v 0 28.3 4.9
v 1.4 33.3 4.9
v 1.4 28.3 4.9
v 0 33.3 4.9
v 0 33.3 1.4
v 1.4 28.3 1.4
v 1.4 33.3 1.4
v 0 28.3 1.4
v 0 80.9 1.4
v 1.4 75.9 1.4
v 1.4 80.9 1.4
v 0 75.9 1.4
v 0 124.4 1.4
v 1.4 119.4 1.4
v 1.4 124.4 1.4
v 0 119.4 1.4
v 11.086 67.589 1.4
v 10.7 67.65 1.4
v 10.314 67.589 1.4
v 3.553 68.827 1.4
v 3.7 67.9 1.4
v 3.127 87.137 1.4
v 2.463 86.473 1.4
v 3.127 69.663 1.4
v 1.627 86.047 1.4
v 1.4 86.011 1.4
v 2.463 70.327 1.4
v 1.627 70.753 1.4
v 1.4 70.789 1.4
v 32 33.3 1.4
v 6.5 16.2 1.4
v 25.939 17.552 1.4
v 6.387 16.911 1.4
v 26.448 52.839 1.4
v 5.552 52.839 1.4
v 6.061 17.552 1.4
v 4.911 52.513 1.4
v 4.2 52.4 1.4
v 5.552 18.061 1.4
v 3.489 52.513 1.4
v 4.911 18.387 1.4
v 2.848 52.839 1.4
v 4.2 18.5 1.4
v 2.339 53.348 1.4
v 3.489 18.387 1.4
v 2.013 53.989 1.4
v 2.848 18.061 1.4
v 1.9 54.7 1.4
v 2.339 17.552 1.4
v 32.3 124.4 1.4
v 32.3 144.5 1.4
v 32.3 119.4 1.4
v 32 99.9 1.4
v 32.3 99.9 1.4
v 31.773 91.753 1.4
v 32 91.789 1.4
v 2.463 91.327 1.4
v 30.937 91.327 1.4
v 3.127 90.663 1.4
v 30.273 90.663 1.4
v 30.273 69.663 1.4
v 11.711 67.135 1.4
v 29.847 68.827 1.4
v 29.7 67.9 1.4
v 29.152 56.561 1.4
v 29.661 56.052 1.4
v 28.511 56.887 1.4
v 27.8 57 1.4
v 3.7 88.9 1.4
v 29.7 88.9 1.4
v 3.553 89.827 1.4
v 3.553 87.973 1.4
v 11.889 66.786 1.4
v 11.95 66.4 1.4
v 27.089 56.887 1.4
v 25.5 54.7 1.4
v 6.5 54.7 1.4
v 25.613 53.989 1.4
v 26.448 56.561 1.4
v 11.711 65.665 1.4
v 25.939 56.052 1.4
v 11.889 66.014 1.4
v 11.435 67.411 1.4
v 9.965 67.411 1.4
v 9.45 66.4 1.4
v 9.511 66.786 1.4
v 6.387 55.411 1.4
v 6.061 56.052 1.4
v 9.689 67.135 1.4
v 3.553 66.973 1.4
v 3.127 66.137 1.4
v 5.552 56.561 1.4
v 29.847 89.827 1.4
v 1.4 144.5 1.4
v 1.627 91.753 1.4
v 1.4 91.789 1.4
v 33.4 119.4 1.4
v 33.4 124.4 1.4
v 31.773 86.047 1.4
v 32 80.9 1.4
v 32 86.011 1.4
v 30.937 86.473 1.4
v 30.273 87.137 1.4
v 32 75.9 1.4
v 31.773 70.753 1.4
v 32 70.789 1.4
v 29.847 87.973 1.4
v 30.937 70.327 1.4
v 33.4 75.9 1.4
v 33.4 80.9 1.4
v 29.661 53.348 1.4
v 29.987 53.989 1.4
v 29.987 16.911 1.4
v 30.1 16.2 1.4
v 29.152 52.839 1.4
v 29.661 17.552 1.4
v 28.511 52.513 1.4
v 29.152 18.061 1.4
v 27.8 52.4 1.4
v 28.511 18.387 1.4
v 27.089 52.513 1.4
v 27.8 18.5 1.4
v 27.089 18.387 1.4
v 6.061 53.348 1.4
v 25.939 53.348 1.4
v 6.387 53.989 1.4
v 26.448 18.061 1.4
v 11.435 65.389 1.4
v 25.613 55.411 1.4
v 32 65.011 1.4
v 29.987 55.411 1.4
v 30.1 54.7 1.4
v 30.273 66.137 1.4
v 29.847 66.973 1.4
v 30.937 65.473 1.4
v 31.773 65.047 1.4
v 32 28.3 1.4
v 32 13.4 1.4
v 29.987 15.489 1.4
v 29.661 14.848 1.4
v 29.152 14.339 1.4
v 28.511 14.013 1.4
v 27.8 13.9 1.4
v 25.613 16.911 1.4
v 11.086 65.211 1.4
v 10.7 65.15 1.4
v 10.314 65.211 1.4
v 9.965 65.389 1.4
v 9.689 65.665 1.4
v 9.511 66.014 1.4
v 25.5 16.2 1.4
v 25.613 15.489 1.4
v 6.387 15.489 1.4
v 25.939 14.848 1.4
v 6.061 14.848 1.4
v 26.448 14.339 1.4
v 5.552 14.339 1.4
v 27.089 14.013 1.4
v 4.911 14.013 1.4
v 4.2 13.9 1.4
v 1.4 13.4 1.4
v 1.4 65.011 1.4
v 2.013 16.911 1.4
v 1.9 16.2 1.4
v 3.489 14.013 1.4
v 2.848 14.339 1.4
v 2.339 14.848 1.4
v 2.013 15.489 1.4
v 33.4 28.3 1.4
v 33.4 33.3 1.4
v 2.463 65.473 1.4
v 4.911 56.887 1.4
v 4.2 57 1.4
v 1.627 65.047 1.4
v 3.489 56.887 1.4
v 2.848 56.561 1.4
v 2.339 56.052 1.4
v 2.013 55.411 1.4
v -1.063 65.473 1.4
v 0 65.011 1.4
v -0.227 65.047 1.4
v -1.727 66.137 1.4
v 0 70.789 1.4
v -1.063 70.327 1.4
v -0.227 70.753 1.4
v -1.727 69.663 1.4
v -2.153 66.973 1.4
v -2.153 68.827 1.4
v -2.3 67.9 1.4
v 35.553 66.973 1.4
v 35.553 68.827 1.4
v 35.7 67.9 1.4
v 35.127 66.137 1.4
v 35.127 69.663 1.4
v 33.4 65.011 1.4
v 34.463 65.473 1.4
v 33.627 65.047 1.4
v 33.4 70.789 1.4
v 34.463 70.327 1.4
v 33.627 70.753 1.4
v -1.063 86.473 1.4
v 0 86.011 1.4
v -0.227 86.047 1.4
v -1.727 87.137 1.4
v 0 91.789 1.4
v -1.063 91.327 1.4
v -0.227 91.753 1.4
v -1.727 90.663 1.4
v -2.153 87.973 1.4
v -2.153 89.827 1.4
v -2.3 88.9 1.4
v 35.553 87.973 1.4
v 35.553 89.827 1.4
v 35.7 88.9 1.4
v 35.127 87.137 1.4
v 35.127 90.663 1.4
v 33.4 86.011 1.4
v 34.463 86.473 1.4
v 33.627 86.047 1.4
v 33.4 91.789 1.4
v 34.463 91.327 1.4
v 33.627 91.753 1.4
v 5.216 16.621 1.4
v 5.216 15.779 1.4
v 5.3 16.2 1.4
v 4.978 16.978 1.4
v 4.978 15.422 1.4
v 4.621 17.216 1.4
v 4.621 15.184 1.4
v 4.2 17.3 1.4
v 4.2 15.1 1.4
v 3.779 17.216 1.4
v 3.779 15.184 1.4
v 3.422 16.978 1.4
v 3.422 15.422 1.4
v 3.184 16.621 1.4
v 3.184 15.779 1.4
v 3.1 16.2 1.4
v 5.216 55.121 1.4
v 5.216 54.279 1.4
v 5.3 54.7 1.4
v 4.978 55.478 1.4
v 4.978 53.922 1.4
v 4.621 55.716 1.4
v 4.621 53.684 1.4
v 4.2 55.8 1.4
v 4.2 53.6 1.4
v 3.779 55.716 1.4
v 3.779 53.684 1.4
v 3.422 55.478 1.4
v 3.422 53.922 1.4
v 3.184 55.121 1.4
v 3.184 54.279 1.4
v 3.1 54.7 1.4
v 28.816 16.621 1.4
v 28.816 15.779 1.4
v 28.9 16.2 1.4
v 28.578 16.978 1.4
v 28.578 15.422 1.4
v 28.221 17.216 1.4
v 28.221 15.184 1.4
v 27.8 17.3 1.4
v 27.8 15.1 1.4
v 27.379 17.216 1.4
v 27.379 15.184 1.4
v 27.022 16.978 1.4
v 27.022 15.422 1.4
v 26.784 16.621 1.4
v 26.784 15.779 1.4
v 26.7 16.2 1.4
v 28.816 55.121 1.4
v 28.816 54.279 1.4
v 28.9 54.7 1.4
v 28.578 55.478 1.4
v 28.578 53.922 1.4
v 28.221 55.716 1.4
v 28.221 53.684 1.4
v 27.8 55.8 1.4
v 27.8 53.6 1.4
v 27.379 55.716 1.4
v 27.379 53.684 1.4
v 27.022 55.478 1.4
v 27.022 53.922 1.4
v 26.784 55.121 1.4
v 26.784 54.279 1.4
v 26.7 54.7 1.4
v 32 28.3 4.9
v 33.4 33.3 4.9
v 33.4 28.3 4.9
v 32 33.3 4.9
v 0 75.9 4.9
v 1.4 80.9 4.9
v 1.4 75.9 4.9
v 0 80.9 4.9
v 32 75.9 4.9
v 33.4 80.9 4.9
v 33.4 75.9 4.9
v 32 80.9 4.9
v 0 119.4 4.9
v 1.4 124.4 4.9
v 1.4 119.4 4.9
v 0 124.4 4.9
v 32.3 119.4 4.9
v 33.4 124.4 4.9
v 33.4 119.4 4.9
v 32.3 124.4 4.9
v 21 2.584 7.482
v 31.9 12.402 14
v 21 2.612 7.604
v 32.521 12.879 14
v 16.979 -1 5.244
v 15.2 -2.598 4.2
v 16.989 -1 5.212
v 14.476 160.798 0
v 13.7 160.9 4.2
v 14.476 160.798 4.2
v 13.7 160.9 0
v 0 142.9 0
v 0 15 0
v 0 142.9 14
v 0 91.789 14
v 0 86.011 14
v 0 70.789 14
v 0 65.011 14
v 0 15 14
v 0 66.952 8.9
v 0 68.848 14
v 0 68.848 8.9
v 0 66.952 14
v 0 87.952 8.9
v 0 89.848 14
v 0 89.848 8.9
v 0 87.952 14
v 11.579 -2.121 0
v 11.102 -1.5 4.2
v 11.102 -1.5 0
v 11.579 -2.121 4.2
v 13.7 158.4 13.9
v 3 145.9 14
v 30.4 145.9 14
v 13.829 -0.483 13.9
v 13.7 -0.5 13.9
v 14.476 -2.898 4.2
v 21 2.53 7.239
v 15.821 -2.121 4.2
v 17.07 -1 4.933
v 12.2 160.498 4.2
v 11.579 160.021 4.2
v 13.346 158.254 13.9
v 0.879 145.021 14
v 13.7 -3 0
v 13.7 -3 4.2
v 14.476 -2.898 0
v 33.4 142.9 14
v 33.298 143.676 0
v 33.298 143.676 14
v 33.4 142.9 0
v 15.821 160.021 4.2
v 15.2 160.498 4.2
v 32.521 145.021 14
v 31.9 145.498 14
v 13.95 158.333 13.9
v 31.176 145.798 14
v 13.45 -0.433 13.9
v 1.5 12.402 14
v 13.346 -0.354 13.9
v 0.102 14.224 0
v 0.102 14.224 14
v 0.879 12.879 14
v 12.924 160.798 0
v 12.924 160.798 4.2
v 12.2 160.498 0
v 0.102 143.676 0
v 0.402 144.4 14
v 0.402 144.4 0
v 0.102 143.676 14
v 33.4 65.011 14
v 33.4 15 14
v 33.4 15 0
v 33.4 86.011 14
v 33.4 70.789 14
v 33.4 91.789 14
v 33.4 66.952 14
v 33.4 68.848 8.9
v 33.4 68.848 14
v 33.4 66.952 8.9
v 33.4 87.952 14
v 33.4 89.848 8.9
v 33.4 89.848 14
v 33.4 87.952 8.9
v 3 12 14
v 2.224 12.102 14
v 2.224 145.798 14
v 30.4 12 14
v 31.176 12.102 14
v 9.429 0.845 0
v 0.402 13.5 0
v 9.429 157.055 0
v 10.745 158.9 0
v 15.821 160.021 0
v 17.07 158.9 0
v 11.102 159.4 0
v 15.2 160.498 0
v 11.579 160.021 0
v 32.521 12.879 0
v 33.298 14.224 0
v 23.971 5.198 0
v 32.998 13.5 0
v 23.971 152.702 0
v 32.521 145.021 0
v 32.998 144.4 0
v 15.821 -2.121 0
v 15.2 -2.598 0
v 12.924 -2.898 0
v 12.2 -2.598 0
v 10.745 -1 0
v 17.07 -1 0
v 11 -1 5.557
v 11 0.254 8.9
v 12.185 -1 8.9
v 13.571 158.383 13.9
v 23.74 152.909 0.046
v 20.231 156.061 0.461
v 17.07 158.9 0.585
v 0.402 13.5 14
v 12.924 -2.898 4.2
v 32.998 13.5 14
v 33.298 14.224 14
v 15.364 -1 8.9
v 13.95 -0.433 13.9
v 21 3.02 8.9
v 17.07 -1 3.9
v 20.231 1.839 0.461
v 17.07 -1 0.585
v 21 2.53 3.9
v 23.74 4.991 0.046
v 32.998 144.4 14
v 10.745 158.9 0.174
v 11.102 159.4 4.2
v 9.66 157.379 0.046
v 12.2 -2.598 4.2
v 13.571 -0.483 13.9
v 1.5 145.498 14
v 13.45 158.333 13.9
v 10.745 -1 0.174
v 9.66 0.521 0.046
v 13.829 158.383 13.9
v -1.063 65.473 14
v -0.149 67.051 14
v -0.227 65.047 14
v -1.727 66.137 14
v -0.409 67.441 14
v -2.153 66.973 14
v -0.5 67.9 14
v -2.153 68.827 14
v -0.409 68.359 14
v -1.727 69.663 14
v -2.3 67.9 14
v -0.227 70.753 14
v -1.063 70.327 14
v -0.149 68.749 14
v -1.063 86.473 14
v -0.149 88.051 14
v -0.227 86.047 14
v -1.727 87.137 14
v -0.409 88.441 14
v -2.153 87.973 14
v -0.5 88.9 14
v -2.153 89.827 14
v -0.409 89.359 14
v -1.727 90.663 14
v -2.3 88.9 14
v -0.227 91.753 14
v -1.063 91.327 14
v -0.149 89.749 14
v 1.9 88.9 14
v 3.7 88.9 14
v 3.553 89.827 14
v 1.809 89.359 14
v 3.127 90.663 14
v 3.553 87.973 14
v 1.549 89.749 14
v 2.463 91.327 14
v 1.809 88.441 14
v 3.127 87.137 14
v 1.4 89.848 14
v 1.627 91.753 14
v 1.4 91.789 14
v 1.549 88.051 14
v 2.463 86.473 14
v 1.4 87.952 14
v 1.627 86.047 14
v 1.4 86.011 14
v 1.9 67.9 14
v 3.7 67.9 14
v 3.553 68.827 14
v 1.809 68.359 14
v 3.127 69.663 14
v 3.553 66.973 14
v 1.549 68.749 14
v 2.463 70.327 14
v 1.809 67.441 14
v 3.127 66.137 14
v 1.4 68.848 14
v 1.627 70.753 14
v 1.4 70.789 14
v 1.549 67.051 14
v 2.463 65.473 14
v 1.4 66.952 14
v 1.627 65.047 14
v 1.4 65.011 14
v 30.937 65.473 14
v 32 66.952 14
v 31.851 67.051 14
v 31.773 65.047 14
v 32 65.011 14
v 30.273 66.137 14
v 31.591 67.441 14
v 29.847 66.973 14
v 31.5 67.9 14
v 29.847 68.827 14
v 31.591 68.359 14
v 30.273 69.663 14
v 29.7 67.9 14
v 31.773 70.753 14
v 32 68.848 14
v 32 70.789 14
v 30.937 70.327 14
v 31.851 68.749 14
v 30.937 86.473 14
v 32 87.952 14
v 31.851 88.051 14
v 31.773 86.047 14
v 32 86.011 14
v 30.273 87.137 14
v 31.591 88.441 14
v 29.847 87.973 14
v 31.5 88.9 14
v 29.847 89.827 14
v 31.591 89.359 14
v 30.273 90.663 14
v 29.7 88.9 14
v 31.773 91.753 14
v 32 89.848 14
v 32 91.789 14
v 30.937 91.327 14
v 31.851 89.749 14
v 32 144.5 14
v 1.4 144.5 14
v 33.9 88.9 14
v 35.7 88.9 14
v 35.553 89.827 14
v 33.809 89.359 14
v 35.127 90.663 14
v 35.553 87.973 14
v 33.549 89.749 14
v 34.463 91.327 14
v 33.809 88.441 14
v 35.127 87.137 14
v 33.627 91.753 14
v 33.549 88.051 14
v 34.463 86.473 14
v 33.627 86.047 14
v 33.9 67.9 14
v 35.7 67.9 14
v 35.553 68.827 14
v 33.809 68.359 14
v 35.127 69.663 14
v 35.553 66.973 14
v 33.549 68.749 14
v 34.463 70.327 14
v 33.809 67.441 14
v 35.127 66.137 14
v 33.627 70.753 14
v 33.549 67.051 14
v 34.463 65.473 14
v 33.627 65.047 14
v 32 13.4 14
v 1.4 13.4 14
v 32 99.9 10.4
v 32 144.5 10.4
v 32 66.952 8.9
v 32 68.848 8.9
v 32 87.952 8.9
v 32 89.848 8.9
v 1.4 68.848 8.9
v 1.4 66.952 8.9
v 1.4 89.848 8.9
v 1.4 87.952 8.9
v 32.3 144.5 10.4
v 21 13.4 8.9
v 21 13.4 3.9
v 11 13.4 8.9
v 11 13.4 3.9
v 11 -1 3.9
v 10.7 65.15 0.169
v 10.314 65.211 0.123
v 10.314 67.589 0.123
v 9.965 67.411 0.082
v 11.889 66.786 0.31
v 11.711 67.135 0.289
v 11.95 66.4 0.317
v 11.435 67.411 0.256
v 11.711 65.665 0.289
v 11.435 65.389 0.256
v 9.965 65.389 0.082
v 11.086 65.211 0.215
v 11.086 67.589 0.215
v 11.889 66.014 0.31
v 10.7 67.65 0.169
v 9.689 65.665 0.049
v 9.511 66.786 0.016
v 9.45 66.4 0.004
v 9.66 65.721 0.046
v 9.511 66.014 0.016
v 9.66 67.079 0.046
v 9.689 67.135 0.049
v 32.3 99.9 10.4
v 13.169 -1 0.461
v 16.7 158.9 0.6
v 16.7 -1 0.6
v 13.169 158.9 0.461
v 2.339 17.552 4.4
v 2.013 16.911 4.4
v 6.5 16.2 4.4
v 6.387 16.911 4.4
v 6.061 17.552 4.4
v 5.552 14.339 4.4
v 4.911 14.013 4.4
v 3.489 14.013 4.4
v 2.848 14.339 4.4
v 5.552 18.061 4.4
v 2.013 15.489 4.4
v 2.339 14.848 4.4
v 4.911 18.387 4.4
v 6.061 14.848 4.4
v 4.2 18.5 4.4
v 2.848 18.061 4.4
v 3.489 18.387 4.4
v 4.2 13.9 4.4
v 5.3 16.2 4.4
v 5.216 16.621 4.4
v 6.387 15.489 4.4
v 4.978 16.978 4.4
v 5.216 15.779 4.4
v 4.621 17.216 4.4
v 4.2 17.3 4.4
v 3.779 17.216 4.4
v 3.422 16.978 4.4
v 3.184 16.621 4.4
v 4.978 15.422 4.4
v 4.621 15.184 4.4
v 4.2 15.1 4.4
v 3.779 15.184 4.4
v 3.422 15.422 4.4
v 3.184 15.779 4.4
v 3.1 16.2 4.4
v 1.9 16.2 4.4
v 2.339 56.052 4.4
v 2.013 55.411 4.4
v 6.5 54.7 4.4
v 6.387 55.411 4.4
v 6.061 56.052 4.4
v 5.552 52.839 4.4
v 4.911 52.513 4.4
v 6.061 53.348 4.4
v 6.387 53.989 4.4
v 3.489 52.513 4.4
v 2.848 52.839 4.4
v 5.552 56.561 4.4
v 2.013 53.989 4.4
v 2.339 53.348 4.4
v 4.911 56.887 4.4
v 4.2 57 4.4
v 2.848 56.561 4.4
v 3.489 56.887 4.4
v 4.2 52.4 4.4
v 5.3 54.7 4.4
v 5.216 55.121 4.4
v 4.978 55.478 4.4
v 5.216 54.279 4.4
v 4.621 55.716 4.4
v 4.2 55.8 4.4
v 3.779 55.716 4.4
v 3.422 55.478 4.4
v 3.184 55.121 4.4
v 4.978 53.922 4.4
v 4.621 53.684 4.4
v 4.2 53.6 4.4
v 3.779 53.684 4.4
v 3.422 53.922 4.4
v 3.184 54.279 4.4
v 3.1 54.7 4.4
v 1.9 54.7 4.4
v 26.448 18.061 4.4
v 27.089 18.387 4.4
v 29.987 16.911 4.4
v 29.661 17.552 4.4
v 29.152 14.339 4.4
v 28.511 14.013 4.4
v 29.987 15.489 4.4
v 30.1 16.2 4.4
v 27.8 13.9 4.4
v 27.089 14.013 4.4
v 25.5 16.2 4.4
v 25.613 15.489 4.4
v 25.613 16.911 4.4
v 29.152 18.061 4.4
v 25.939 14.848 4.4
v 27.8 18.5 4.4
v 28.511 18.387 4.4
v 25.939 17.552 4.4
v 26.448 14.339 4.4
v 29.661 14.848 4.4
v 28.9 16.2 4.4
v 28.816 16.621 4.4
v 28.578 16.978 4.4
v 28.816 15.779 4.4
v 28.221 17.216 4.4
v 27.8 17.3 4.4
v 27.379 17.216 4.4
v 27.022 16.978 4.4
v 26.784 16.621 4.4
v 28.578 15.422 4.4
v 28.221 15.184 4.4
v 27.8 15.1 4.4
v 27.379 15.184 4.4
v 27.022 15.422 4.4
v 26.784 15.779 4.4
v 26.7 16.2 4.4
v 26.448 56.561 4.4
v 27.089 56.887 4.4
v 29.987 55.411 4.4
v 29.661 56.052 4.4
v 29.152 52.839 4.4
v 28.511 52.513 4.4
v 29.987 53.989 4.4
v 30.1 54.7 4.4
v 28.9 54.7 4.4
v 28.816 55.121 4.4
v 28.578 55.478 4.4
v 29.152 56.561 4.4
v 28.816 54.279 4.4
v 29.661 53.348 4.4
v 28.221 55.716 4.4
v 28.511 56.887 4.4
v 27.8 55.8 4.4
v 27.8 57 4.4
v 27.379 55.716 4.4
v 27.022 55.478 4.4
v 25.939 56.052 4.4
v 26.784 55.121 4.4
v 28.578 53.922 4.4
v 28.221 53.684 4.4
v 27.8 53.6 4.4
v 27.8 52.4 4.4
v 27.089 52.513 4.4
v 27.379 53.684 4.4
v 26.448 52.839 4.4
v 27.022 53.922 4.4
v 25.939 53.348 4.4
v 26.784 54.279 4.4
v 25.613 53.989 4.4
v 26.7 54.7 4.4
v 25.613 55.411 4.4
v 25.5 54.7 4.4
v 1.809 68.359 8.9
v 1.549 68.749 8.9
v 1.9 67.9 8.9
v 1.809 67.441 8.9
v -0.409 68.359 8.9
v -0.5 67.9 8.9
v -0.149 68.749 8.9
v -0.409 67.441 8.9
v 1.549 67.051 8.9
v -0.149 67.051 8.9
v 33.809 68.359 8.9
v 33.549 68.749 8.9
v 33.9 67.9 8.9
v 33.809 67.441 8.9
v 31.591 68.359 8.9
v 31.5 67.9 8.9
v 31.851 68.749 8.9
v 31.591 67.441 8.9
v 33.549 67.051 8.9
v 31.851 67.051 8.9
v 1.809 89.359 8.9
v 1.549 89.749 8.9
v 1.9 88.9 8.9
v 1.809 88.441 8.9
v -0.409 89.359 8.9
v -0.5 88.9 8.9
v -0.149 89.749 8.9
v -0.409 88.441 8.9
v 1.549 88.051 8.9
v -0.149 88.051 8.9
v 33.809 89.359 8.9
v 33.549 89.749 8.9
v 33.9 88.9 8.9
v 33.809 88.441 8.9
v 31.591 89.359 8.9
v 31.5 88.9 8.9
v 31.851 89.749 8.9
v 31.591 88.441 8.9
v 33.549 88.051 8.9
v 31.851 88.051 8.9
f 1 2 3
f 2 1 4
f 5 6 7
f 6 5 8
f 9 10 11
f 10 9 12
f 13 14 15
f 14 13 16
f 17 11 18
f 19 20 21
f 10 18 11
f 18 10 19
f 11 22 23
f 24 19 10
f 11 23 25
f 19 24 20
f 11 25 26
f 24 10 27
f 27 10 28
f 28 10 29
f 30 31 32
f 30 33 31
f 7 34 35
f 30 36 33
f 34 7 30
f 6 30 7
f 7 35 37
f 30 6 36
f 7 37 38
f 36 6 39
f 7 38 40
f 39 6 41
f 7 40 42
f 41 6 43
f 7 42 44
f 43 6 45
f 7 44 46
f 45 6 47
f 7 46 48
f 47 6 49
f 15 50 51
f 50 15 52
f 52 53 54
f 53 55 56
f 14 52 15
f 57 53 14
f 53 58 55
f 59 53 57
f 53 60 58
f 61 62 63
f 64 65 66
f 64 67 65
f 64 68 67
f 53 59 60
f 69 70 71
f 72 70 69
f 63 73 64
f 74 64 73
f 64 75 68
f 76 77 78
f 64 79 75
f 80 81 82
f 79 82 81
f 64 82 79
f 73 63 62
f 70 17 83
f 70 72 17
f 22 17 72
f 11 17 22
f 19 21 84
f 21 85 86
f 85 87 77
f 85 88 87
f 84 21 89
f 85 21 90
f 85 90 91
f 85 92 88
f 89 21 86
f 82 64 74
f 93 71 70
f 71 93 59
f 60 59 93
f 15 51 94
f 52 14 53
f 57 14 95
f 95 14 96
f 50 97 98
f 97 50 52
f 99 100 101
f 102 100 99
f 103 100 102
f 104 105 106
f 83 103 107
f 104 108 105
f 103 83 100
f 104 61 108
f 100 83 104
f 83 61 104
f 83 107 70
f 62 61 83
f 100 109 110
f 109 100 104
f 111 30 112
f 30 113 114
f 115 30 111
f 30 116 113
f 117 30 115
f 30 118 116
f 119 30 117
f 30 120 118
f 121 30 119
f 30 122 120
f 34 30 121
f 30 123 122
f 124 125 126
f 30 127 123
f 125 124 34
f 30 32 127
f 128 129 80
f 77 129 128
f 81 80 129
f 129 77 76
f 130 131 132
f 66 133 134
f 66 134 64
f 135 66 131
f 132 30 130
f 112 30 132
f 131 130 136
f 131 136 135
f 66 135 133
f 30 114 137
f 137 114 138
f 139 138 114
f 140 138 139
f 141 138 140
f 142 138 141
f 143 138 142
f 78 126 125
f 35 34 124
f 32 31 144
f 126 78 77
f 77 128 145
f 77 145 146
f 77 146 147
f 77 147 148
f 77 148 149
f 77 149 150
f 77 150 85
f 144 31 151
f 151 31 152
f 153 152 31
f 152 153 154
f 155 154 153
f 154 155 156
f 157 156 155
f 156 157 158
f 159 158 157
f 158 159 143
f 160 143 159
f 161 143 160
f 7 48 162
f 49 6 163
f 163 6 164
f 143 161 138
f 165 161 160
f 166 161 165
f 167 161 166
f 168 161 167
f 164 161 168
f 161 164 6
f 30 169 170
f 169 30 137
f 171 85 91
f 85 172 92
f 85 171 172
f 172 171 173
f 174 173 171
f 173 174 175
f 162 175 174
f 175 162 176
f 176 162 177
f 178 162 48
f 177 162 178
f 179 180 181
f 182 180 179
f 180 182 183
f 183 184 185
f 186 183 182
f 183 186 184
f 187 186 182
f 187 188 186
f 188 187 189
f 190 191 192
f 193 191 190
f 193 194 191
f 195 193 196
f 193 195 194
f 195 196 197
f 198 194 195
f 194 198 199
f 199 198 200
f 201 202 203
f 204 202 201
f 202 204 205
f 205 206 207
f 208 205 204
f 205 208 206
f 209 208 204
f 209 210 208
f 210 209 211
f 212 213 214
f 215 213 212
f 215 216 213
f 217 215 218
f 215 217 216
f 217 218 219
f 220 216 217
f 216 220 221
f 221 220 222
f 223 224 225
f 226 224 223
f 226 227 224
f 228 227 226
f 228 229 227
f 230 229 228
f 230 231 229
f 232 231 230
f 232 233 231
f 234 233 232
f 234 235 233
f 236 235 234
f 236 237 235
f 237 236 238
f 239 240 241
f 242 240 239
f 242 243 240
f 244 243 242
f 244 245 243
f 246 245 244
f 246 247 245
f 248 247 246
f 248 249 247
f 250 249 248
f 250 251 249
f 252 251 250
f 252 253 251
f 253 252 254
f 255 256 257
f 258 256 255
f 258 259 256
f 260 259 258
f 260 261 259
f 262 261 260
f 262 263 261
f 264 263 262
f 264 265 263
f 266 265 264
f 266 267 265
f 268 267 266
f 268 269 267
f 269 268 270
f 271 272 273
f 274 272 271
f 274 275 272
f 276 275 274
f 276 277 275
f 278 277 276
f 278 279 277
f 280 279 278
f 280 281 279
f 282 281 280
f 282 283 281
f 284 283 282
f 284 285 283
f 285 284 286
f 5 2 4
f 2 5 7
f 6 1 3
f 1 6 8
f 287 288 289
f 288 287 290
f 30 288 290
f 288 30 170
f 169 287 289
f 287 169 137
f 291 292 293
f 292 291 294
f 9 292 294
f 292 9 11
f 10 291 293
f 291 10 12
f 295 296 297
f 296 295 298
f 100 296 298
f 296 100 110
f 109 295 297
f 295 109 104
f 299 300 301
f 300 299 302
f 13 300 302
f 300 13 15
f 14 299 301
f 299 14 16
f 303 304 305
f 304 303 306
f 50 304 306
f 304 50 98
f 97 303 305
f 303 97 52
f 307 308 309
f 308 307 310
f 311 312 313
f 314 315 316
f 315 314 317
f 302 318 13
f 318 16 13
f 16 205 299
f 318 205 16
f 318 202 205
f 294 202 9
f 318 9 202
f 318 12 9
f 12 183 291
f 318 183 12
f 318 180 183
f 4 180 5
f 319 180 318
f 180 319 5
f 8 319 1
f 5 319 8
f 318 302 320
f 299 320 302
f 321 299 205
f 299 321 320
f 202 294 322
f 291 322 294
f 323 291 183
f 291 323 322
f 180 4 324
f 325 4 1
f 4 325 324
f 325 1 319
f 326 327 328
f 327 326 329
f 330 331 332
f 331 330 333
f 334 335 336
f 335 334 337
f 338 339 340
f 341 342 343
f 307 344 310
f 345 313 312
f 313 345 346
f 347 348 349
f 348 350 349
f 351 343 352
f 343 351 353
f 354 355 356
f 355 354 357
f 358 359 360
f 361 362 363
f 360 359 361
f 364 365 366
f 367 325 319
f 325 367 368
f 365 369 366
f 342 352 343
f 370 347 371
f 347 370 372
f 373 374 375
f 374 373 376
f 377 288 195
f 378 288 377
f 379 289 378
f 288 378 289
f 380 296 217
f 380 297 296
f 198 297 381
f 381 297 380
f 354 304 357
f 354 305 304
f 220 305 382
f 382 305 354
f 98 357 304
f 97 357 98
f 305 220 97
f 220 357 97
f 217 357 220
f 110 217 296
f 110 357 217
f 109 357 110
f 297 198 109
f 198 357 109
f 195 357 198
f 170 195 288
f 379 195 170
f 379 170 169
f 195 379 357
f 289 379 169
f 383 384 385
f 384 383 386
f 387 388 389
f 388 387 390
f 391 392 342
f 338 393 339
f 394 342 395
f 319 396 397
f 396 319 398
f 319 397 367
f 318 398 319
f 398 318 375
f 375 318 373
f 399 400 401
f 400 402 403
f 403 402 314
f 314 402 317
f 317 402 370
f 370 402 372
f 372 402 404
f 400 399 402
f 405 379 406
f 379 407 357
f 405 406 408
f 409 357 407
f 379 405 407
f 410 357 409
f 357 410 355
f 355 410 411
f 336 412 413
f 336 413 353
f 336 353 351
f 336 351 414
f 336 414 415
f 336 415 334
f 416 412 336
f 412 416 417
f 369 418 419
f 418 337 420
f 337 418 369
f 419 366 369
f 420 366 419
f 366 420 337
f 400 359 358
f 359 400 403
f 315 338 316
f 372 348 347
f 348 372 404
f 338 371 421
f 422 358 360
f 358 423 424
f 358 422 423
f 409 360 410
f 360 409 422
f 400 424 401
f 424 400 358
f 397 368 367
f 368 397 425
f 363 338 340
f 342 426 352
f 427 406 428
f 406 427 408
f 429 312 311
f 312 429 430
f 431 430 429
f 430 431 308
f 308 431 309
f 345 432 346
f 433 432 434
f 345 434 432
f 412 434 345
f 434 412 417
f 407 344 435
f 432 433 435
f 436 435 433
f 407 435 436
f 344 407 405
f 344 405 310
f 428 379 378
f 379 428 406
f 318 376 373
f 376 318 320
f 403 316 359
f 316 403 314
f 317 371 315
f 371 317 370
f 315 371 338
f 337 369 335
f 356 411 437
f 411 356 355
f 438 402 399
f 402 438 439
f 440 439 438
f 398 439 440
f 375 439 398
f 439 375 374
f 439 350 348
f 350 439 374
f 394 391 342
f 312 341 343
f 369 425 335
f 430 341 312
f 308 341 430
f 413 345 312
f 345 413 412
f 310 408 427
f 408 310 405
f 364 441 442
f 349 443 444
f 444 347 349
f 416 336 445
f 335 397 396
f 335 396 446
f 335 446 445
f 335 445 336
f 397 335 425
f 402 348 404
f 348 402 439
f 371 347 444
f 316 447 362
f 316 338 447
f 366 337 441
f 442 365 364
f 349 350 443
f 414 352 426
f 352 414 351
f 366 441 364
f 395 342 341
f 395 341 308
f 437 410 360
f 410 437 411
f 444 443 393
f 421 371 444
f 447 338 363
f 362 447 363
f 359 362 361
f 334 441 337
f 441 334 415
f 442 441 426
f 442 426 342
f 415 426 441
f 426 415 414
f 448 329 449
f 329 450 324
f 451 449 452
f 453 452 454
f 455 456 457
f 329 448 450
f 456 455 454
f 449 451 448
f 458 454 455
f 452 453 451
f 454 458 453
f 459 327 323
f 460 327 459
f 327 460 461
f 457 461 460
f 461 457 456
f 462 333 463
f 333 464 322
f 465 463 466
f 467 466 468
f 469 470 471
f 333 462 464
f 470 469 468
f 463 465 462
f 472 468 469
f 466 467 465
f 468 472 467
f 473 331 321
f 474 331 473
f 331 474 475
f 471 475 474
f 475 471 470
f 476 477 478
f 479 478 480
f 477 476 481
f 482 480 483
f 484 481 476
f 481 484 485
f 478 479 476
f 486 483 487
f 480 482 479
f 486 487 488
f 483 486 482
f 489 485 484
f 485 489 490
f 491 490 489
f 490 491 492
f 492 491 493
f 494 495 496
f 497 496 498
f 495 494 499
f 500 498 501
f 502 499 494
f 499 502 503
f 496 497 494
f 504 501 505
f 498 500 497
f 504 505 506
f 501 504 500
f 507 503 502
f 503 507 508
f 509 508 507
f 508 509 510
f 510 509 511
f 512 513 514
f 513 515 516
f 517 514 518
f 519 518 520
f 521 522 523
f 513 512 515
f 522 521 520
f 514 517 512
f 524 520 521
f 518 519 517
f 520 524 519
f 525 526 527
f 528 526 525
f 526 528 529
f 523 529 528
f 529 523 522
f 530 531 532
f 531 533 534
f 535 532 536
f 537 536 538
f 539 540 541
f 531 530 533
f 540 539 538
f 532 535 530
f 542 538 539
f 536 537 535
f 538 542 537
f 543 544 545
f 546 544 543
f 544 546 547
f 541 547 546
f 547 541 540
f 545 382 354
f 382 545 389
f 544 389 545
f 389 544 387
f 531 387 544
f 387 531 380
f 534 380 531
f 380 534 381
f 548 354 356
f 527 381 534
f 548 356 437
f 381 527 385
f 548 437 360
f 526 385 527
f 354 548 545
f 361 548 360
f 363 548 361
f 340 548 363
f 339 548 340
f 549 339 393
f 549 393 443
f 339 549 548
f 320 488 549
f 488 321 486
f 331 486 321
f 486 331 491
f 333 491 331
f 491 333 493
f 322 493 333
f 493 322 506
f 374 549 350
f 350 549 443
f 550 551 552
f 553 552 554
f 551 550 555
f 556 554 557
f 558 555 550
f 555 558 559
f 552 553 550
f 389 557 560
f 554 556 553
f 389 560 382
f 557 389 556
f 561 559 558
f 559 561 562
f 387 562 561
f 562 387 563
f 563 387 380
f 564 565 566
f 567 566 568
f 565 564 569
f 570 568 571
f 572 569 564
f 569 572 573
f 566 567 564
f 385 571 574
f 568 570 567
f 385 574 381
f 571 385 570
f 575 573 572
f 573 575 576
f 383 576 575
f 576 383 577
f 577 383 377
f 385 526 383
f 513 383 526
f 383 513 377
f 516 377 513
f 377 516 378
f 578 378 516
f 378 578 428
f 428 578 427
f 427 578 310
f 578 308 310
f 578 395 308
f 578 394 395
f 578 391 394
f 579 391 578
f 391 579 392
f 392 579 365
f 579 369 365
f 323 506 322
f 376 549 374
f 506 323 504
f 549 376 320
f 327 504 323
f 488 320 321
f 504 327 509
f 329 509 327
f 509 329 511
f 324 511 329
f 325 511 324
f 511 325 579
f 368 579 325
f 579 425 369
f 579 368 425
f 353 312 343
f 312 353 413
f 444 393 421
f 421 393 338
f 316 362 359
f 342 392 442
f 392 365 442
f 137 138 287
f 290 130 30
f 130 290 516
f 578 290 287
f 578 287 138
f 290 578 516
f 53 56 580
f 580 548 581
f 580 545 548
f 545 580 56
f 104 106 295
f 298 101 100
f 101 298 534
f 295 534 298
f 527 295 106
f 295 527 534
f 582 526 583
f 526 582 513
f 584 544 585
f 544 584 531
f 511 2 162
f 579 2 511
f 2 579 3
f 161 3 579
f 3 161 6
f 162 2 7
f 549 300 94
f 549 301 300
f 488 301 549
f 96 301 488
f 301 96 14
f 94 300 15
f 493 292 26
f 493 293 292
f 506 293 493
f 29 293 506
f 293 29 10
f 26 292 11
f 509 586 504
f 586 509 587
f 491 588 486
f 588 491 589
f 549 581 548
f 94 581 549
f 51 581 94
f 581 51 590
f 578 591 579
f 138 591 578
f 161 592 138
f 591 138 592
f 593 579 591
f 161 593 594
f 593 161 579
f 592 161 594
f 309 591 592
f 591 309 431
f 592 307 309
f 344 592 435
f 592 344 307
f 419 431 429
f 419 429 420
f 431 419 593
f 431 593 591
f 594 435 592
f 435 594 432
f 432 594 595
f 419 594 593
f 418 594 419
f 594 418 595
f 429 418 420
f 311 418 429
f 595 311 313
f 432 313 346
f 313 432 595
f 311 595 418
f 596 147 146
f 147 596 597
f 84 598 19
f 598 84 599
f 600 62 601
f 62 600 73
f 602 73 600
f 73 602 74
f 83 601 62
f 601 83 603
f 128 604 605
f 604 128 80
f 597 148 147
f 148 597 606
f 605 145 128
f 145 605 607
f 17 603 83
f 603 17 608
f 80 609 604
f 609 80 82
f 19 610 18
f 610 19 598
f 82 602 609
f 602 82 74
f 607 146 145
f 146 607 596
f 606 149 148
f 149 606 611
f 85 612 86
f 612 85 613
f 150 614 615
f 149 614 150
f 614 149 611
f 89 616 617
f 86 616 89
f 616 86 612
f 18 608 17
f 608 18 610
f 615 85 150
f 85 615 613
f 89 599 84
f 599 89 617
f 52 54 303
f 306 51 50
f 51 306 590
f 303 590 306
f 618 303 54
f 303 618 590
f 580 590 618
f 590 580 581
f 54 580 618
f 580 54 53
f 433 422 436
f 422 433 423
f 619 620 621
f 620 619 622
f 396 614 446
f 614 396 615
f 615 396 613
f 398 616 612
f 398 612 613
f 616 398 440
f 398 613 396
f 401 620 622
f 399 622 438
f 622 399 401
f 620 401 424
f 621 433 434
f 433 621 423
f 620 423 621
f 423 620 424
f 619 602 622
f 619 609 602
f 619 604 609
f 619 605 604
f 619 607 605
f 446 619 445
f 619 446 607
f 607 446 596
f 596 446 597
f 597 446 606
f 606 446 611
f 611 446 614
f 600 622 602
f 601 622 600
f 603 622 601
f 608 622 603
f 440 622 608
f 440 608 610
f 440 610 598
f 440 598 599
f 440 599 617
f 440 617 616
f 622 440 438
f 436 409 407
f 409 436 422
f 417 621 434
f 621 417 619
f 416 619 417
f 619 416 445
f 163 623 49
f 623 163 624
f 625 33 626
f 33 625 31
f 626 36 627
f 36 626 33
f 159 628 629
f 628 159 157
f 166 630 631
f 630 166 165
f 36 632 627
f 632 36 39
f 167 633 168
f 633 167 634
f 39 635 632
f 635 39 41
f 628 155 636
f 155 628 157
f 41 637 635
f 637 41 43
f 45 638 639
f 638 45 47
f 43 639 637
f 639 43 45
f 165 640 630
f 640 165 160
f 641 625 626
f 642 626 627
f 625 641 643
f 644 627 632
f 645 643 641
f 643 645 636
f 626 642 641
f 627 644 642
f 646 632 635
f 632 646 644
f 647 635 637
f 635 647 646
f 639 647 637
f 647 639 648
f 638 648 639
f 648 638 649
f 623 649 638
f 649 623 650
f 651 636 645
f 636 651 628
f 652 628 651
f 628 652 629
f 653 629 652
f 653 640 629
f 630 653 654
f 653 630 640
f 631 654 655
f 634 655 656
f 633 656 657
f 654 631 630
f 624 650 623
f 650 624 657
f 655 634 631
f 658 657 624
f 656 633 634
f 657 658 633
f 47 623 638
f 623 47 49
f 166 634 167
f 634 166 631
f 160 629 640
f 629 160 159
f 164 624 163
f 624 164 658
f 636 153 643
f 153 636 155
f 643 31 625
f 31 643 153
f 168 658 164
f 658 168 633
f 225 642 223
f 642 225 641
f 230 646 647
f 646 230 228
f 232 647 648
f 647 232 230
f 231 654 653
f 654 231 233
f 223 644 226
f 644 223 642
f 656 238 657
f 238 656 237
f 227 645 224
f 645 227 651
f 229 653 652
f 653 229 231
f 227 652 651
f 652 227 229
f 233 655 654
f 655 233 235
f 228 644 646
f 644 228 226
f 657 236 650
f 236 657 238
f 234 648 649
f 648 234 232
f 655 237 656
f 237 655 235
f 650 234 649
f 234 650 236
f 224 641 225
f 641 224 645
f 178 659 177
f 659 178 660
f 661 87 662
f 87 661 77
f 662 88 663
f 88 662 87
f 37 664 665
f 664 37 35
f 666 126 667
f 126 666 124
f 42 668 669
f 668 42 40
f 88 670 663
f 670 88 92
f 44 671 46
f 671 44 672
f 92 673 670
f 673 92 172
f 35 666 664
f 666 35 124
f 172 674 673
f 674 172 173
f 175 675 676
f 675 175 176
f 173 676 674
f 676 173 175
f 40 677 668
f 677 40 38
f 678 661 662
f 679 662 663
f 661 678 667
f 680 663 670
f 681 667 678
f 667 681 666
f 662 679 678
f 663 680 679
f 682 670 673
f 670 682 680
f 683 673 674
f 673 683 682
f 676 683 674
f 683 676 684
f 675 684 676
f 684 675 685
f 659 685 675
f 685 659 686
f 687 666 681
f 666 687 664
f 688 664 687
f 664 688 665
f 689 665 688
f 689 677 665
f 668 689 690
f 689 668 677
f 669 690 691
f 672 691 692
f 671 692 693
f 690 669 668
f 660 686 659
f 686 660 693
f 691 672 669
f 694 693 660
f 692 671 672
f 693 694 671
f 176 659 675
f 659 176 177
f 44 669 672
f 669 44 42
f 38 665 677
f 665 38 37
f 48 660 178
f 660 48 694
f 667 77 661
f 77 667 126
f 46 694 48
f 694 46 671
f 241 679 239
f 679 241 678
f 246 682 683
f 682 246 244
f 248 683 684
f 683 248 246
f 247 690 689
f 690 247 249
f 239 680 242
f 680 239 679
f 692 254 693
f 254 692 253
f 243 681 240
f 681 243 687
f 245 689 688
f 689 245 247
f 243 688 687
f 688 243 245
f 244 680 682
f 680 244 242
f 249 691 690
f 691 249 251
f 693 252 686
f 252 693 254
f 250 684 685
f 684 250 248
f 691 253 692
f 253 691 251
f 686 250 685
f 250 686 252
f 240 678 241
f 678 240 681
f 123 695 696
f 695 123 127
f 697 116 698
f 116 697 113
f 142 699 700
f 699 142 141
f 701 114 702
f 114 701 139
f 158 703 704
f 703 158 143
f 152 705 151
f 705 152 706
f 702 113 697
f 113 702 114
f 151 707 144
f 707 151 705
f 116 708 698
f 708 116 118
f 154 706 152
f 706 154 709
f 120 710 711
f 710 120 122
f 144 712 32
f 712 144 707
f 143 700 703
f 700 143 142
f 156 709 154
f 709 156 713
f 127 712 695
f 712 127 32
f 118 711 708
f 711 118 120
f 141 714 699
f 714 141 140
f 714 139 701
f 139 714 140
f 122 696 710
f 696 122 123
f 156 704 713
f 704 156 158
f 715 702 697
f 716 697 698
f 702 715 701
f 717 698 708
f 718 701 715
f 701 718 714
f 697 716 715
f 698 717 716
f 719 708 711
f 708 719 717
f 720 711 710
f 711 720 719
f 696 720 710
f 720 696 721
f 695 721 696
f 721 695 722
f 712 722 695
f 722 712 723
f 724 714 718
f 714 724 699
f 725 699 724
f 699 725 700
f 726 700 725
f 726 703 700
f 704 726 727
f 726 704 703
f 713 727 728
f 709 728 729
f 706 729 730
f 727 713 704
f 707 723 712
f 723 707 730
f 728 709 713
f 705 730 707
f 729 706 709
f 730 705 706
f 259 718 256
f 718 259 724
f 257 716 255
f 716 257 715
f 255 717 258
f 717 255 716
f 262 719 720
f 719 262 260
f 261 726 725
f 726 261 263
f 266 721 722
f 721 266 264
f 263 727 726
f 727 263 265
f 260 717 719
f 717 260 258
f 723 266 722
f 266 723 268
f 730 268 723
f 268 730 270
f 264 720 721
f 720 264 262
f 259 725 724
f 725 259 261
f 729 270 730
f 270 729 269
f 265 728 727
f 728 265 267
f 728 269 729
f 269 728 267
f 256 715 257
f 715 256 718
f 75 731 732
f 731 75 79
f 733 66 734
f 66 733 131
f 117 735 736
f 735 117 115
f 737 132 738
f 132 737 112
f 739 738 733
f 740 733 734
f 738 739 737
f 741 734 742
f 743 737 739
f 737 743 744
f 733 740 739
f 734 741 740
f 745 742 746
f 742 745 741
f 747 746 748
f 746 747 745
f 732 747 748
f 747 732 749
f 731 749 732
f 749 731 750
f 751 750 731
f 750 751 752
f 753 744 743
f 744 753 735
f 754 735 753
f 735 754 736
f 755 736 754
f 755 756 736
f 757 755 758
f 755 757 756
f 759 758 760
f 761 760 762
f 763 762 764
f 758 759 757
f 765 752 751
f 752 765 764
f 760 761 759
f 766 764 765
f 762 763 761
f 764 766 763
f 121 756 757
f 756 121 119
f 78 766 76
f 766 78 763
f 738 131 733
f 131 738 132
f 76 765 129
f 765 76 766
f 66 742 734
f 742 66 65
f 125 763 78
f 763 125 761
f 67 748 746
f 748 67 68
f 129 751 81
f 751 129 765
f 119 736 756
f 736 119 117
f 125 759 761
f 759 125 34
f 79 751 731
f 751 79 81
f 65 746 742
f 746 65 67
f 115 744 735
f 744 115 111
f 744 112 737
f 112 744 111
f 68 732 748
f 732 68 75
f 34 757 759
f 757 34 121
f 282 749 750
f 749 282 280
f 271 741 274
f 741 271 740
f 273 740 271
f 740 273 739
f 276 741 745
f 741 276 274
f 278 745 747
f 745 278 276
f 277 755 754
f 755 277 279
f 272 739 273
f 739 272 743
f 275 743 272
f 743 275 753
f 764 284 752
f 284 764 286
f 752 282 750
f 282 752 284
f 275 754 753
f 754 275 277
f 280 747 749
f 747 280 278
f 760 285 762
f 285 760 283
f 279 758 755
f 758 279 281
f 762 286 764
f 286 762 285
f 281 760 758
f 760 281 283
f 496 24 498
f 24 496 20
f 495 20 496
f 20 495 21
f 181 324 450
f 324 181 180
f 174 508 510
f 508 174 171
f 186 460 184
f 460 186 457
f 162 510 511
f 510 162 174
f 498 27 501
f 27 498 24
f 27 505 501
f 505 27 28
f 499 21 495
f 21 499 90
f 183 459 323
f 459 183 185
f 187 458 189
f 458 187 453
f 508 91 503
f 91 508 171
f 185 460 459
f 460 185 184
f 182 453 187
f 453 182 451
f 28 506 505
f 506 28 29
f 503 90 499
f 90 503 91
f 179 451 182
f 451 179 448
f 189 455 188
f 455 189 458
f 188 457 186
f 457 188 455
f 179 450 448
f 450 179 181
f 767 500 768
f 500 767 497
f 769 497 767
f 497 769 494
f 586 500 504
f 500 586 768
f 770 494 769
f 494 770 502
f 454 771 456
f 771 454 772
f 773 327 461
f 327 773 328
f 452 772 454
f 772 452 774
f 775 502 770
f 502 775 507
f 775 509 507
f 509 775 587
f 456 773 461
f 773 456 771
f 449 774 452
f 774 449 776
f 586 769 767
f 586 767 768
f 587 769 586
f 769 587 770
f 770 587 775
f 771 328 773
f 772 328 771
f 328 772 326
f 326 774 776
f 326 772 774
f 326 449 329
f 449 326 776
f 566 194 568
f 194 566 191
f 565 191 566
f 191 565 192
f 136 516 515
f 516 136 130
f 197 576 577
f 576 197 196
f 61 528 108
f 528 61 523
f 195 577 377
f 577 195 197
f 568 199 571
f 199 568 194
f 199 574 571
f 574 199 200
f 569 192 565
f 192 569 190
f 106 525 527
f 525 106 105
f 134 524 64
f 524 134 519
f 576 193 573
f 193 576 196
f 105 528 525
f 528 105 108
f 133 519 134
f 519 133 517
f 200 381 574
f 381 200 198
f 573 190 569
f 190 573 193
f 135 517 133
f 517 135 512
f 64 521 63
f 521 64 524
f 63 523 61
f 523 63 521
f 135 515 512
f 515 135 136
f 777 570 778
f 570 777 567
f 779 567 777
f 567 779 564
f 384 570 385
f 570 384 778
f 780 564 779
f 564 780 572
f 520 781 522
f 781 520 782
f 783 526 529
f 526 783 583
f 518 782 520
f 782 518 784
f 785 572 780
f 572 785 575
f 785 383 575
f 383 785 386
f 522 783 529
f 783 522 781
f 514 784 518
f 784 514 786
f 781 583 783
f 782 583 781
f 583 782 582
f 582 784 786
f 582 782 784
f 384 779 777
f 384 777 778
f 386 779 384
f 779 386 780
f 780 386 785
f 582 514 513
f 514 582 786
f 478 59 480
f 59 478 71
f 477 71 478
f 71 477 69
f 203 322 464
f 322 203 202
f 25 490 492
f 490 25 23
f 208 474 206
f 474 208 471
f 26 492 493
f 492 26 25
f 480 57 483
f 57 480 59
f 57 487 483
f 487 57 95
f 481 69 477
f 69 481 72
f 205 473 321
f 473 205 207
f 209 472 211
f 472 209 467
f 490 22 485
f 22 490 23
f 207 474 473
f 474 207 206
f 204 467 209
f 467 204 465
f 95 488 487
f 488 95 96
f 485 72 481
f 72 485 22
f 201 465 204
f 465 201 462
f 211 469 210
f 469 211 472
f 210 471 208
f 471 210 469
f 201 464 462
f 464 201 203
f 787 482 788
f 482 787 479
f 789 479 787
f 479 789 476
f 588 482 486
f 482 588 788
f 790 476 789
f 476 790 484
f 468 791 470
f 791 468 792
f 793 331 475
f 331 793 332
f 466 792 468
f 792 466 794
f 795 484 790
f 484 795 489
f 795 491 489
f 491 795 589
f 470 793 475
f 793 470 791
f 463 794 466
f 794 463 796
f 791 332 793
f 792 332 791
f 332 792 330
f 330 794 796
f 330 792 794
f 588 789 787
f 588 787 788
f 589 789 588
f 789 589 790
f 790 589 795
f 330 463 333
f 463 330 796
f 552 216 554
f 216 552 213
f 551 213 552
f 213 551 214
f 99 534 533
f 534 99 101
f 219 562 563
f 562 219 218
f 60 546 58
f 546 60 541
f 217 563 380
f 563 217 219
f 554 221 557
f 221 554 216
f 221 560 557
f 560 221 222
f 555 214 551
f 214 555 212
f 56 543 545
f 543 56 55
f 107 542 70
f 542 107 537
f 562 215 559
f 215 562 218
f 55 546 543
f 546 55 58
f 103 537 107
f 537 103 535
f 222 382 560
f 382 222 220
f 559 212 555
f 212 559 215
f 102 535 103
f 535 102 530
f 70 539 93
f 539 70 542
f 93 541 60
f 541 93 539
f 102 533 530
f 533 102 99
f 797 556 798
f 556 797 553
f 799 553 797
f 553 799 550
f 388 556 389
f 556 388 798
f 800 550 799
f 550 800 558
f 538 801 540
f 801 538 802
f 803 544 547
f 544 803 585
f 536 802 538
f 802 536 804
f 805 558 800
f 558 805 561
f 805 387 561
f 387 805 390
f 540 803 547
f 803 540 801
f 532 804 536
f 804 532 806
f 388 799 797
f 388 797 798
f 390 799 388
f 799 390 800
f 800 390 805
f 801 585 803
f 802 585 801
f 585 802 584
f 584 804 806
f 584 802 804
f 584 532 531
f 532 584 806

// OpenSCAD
// Wasserraketen-Tracker Gehäuse v4 — Aerodynamisch, leicht, Klebebefestigung
// Auf Flasche kleben: Längsachse entlang der Rakete
// Waveshare ESP32-S3-Touch-AMOLED-1.64" + BMP388 + MPU6050
// LiPo extern · kein Schnappverschluss · Rippen statt dicke Wände
//
// Drucken: 0.15mm Schichthöhe, 3 Perimeter, 15% Gyroid-Infill, PLA/PETG

// ── Hauptparameter ────────────────────────────────────────────────────────────
wall      = 1.4;   // Wandstärke (leicht aber stabil durch Rippen)
rib_w     = 1.2;   // Rippenbreite
tol       = 0.3;   // Passungsspiel

bottle_r  = 45.0;  // Flaschenradius (Standard 1,5L PET ~Ø90mm)

// PCB — Waveshare ESP32-S3-Touch-AMOLED-1.64 (Datenblatt)
board_w   = 28.6;   // PCB Breite
board_l   = 43.5;   // PCB Länge (USB-C vorne)
board_h   = 9.6;    // Gesamthöhe inkl. Display-Modul (Seitenansicht)
sensor_l  = 37.0;   // BMP388 18mm + 3mm Abstand + MPU6050 16mm (in Reihe)
gap       = 3.0;

// LiPo — 500mAh (Amazon B0DPZNZ4D6)
bat_w     = 30.0;
bat_l     = 44.0;
bat_h     = 8.0;

// Display-Fenster (Datenblatt: Glasfläche 29.12×44mm, sichtbar ~22.34×36mm)
disp_w    = 22.34;
disp_h    = 36.06;
disp_off_x =  3.1;  // (28.6 - 22.34) / 2
disp_off_y =  2.3;  // oberer Rand laut Datenblatt

// Innenraum: Battery (30mm) etwas breiter als PCB (28.6mm) → bestimmt Breite
inner_w = max(board_w, bat_w) + tol * 2;  // 30.6 mm  ← quer zur Rakete
inner_l = board_l + gap + sensor_l + gap + bat_l + tol * 2;  // ~134 mm
inner_h = board_h + 3.0;              // 12.6 mm — display bündig mit Oberkante

// Außenhülle
outer_w = inner_w + wall * 2;
outer_l = inner_l + wall * 2;
outer_h = inner_h + wall;             // oben geschlossen, unten offen (Flasche)

// Aerodynamische Verlängerung: Nase + Heck verjüngen sich
fairing  = 12.0;  // Länge der Keilverjüngung vorne + hinten
total_l  = outer_l + fairing * 2;

// Display-Fenster (oben) — aus Datenblatt
disp_ox  = disp_off_x + tol;
disp_oy  = disp_off_y + tol + fairing;

// USB-C Schlitz (vordere Stirnseite)
usb_w    = 10.0;
usb_h    =  4.0;

// JST ext. LiPo (Seite)
jst_w    =  7.0;
jst_h    =  4.0;

// ── Hilfsfunktionen ───────────────────────────────────────────────────────────
module rounded_box(w, l, h, r = 2) {
    hull()
        for (x = [r, w - r], y = [r, l - r])
            translate([x, y, 0]) cylinder(r = r, h = h, $fn = 24);
}

// Flaschenwölbung: Zylinder von unten subtrahieren
module bottle_cutout() {
    // Zylinder liegt unter dem Gehäuse, Achse quer
    translate([outer_w / 2, total_l / 2, -bottle_r + 0.6])
        rotate([90, 0, 0])
        cylinder(r = bottle_r, h = total_l + 2, center = true, $fn = 80);
}

// Aerodynamische Außenform (Draufsicht: abgerundetes Rechteck mit Spitzen v+h)
module fairing_shell(h) {
    hull() {
        // Hauptkörper
        translate([0, fairing, 0])
            rounded_box(outer_w, outer_l, h, 3);
        // Vordere Spitze (schmal, flach)
        translate([outer_w / 2 - 3, 0, 0])
            cylinder(r = 3, h = h * 0.3, $fn = 24);
        translate([outer_w / 2 - 3, 0, h * 0.3 - 0.1])
            cylinder(r1 = 3, r2 = 0.5, h = h * 0.7, $fn = 24);
        // Hintere Spitze
        translate([outer_w / 2 - 3, total_l, 0])
            cylinder(r = 3, h = h * 0.3, $fn = 24);
        translate([outer_w / 2 - 3, total_l, h * 0.3 - 0.1])
            cylinder(r1 = 3, r2 = 0.5, h = h * 0.7, $fn = 24);
    }
}

// ── Gehäuse ───────────────────────────────────────────────────────────────────
module case_body() {
    difference() {
        fairing_shell(outer_h);

        // Innenraum
        translate([wall, fairing + wall, wall])
            cube([inner_w, inner_l, outer_h]);

        // Display-Fenster (oben)
        translate([disp_ox, disp_oy, outer_h - wall - 0.1])
            rounded_box(disp_w, disp_h, wall + 0.2, 2);

        // USB-C Kabelkanal — durch gesamte Fairing-Nase bis zur Frontwand
        // PCB liegt auf 3mm Bossen → Unterkante USB-C bei z≈3.5mm
        // Kanalbreite 10mm, Höhe 5mm, auf PCB-Mitte zentriert (X=16.0mm)
        pcb_cx = wall + tol + board_w / 2;
        translate([pcb_cx - usb_w / 2, -1, wall + 2.5])
            cube([usb_w, fairing + wall + 1, 5.0]);

        // JST LiPo — Stecker an Hinterkante PCB (Mitte), Kabel läuft intern zur Batterie

        // Kabelbinder-Schlitze (3 Paare) — je links + rechts durch Seitenwand
        // Schlitz: 5mm breit × 3.5mm hoch, unten bündig mit Boden
        ziptie_w = 5.0;  ziptie_h = 3.5;
        for (zy = [fairing + wall + board_l * 0.4,
                   fairing + wall + board_l + gap + sensor_l * 0.5,
                   fairing + wall + board_l + gap + sensor_l + gap + bat_l * 0.5]) {
            // linke Wand
            translate([-1, zy - ziptie_w / 2, wall])
                cube([wall + 2, ziptie_w, ziptie_h]);
            // rechte Wand
            translate([outer_w - wall - 1, zy - ziptie_w / 2, wall])
                cube([wall + 2, ziptie_w, ziptie_h]);
        }

        // Druckausgleich BMP388 (Boden links)
        translate([wall + tol + 9, fairing + wall + board_l + gap + 6.5, -1])
            cylinder(d = 2.5, h = wall + 2, $fn = 20);

        // Batterie-Fach — hinter Sensor-Zone, von oben zugänglich
        bat_y0 = fairing + wall + board_l + gap + sensor_l + gap;
        translate([wall + tol + (max(board_w, bat_w) - bat_w) / 2,
                   bat_y0, wall])
            cube([bat_w + tol * 2, bat_l + tol * 2, bat_h + 1.0]);

        // Flaschenwölbung ausschneiden
        bottle_cutout();
    }

    // M2-Montagebossen (4×) — PCB-Eckbohrungen 2.5mm von Kante (Datenblatt)
    m2_boss_od = 4.6;
    m2_boss_h  = 3.0;
    m2_drill   = 2.2;   // Durchgangsloch M2
    m2_head_d  = 4.5;   // Senkkopf-Versenkung von unten
    m2_head_h  = 1.2;

    for (px = [wall + tol + 2.5, wall + tol + board_w - 2.5])
        for (py = [fairing + wall + tol + 2.5, fairing + wall + tol + board_l - 2.5]) {
            // Boss
            difference() {
                translate([px, py, wall])
                    cylinder(d = m2_boss_od, h = m2_boss_h, $fn = 20);
                // Durchgangsloch
                translate([px, py, -0.1])
                    cylinder(d = m2_drill, h = wall + m2_boss_h + 0.2, $fn = 16);
                // Senkkopf-Aussparung von unten
                translate([px, py, -0.1])
                    cylinder(d = m2_head_d, h = m2_head_h, $fn = 20);
            }
        }

    // Deckel-Montagebossen (4×) — in Seitenwände integriert, Sensor-Zone
    // Blind-M2-Loch von oben, 5mm tief
    lid_boss_r     = 3.0;
    lid_boss_drill = 2.4;
    lid_y1 = fairing + wall + board_l + gap + 8;
    lid_y2 = fairing + wall + board_l + gap + sensor_l - 8;

    for (by = [lid_y1, lid_y2])
        for (bx = [wall / 2, outer_w - wall / 2]) {
            difference() {
                translate([bx, by, wall])
                    cylinder(r = lid_boss_r, h = outer_h - wall, $fn = 20);
                translate([bx, by, outer_h - 5.1])
                    cylinder(d = lid_boss_drill, h = 5.2, $fn = 16);
            }
        }

    // Klebelaschen: 2× breite Flachflächen an Unterseite (bleiben nach bottle_cutout übrig)
    // → entstehen automatisch durch bottle_cutout-Radius
}

// ── Ausgabe ───────────────────────────────────────────────────────────────────
color("DodgerBlue", 0.9) case_body();

echo(str("GESAMT: ", round(outer_w*10)/10, " × ",
         round(total_l*10)/10, " × ",
         round(outer_h*10)/10, " mm"));
echo(str("Fairing je: ", fairing, " mm   Flasche R: ", bottle_r, " mm"));
echo(str("Elektronik-Zone: ", round(outer_l*10)/10, " mm"));
